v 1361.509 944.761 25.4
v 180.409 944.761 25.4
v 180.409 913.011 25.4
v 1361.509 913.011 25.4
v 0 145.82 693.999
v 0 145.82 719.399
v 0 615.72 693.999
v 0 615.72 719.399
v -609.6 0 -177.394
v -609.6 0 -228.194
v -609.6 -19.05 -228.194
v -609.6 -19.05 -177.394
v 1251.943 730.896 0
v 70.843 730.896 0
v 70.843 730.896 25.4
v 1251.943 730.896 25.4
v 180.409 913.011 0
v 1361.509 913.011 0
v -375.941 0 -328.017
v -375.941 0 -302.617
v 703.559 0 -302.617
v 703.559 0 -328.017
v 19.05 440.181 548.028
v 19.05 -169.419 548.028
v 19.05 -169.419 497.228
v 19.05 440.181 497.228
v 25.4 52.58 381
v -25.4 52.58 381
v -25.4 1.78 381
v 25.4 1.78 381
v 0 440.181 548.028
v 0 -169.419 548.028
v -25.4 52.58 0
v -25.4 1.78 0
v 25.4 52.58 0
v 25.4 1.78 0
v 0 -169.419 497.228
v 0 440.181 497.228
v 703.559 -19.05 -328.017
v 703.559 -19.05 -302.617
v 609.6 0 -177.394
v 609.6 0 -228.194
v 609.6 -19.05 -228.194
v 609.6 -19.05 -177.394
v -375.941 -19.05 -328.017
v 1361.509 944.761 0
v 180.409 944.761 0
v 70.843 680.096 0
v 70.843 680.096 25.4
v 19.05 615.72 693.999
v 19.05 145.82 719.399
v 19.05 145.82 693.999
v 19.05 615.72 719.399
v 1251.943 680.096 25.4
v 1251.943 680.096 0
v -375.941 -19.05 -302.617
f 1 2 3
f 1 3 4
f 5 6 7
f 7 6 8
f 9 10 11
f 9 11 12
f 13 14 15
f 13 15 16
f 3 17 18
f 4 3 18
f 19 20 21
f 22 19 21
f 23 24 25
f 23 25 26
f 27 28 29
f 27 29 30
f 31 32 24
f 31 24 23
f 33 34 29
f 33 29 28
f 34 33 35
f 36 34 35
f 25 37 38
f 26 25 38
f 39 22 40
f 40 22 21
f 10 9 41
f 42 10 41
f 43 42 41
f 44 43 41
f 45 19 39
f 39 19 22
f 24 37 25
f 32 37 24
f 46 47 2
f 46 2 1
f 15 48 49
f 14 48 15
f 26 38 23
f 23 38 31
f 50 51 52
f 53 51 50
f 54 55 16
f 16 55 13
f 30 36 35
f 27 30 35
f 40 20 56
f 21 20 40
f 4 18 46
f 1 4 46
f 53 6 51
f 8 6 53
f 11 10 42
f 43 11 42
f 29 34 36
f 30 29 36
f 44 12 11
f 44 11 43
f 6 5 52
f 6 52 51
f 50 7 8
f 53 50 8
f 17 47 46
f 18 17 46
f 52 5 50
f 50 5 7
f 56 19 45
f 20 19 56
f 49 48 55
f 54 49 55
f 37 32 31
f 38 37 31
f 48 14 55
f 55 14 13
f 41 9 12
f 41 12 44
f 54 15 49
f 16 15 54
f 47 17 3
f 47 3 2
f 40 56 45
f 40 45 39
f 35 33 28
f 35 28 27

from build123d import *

# Parameters (mm, degrees)
F0_W      = 50.8
F0_H      = 50.8
F1_DEPTH  = 381
F2_W      = 1219.2
F2_H      = 50.8
F3_DEPTH  = 19.05
F4_W      = 609.6
F4_H      = 50.8
F5_DEPTH  = 19.05
F6_W      = 469.9
F6_H      = 25.4
F7_DEPTH  = 19.05
F8_W      = 1079.5
F8_H      = 25.4
F9_DEPTH  = 19.05
F10_W     = 1181.1
F10_H     = 50.8
F11_DEPTH = 25.4
F12_W     = 1181.1
F12_H     = 31.75
F13_DEPTH = 25.4


with BuildPart() as f1:
    # F0 (on Top) → F1 (new body)
    with BuildSketch(Plane.XY):
        with Locations((0, 27.17964)):
            Rectangle(F0_W, F0_H)
    extrude(amount=F1_DEPTH)


with BuildPart() as f3:
    # F2 (on Front) → F3 (new body)
    with BuildSketch(Plane.XZ):
        with Locations((0, -202.794402)):
            Rectangle(F2_W, F2_H)
    extrude(amount=F3_DEPTH)


with BuildPart() as f5:
    # F4 (on Right) → F5 (new body)
    with BuildSketch(Plane.YZ):
        with Locations((135.38126, 522.627532)):
            Rectangle(F4_W, F4_H)
    extrude(amount=F5_DEPTH)


with BuildPart() as f7:
    # F6 (on Right) → F7 (new body)
    with BuildSketch(Plane.YZ):
        with Locations((380.770034, 706.698775)):
            Rectangle(F6_W, F6_H)
    extrude(amount=F7_DEPTH)


with BuildPart() as f9:
    # F8 (on Front) → F9 (new body)
    with BuildSketch(Plane.XZ):
        with Locations((163.809027, -315.317035)):
            Rectangle(F8_W, F8_H)
    extrude(amount=F9_DEPTH)


with BuildPart() as f11:
    # F10 (on Top) → F11 (new body)
    with BuildSketch(Plane.XY):
        with Locations((661.392548, 705.495894)):
            Rectangle(F10_W, F10_H)
    extrude(amount=F11_DEPTH)


with BuildPart() as f13:
    # F12 (on Top) → F13 (new body)
    with BuildSketch(Plane.XY):
        with Locations((770.958911, 928.885698)):
            Rectangle(F12_W, F12_H)
    extrude(amount=F13_DEPTH)


solid = Compound([f1.part, f3.part, f5.part, f7.part, f9.part, f11.part, f13.part])
